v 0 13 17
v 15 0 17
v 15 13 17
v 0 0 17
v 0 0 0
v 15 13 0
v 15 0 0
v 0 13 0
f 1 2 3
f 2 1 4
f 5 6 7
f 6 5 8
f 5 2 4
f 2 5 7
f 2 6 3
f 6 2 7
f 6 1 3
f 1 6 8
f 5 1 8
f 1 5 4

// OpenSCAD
// Generated by SolidPython 1.0.1 on 2020-07-29 00:46:55


cube(size = [15, 13, 17]);
/***********************************************
*********      SolidPython code:      **********
************************************************
 
# import packages: SolidPython
from solid import *
from solid.utils import *
from itertools import chain, combinations, permutations


class Resize:

    def __init__(self, scad_file):
        self.scad_file = scad_file
        #self.scad_file = import_scad(scad_file)
        # cone/cylinder param:
        self.r1 = 0
        self.r2 = 0
        self.h = 0
        # rectangular prism param:
        self.w = 0
        self.l = 0
        # ellipse param:
        self.r = 0

    # import OpenScad code (file name corresponds to shape)


    # classify shape + parameters
    def assign(self, param1, param2, param3):
        if self.scad_file == 'cone.scad':
            self.r1 = param1
            self.r2 = param2
            self.h = param3
        elif self.scad_file == 'cylinder.scad':
            self.r1 = param1
            self.r2 = param2
            self.h = param3
        elif self.scad_file == 'rectangularPrism.scad':
            self.h = param1
            self.l = param2
            self.w = param3
        else:
            self.r = param1
            self.h = param2

    # resize parameters
    def iterate(self):
        x = range(3, 20, 2)
        i = 1
        if self.scad_file == 'cone.scad':
            tempList = list(permutations(x, 2))
            for temp in tempList:
                param1 = temp[0]
                param2 = temp[1]
                filepath = 'produced_scad_files/' + 'cone' + str(param1) + '_' + str(param2) + '_' + '.scad'
                scad_render_to_file(cylinder(h=param1, r1=param2, r2=0), filepath)

        elif self.scad_file == 'cylinder.scad':
            tempList = list(permutations(x, 3))
            for temp in tempList:
                param1 = temp[0]
                param2 = temp[1]
                filepath = 'produced_scad_files/' + 'cylinder' + str(param1) + '_' + str(param2) + '_' + '.scad'
                scad_render_to_file(cylinder(h=param1, r1=param2, r2=param2), filepath)

        elif self.scad_file == 'rectangularPrism.scad':
            tempList = list(permutations(x, 3))
            for temp in tempList:
                param1 = temp[0]
                param2 = temp[1]
                param3 = temp[2]
                filepath = 'produced_scad_files/' + 'rectangularPrism' + str(param1) + '_' + str(param2) + '_' + str(
                    param3) + '.scad'
                scad_render_to_file(cube(size=(param1, param2, param3)), filepath)

        elif self.scad_file == 'ellipse.scad':
            tempList = list(permutations(x, 4))
            for temp in tempList:
                param1 = temp[0]
                param2 = temp[1]
                param3 = temp[2]
                param4 = temp[3]
                filepath = 'produced_scad_files/' + 'ellipse' + str(param1) + '_' + str(param2) + '_' + str(param3) + '_' + str(param4) + '.scad'
                scad_render_to_file(scale([param1, param2, param3])(sphere(r=param4)), filepath)

    def render_to_scadfile(self):
        scad_render_to_file(scad, 'example.scad') 
 
************************************************/
